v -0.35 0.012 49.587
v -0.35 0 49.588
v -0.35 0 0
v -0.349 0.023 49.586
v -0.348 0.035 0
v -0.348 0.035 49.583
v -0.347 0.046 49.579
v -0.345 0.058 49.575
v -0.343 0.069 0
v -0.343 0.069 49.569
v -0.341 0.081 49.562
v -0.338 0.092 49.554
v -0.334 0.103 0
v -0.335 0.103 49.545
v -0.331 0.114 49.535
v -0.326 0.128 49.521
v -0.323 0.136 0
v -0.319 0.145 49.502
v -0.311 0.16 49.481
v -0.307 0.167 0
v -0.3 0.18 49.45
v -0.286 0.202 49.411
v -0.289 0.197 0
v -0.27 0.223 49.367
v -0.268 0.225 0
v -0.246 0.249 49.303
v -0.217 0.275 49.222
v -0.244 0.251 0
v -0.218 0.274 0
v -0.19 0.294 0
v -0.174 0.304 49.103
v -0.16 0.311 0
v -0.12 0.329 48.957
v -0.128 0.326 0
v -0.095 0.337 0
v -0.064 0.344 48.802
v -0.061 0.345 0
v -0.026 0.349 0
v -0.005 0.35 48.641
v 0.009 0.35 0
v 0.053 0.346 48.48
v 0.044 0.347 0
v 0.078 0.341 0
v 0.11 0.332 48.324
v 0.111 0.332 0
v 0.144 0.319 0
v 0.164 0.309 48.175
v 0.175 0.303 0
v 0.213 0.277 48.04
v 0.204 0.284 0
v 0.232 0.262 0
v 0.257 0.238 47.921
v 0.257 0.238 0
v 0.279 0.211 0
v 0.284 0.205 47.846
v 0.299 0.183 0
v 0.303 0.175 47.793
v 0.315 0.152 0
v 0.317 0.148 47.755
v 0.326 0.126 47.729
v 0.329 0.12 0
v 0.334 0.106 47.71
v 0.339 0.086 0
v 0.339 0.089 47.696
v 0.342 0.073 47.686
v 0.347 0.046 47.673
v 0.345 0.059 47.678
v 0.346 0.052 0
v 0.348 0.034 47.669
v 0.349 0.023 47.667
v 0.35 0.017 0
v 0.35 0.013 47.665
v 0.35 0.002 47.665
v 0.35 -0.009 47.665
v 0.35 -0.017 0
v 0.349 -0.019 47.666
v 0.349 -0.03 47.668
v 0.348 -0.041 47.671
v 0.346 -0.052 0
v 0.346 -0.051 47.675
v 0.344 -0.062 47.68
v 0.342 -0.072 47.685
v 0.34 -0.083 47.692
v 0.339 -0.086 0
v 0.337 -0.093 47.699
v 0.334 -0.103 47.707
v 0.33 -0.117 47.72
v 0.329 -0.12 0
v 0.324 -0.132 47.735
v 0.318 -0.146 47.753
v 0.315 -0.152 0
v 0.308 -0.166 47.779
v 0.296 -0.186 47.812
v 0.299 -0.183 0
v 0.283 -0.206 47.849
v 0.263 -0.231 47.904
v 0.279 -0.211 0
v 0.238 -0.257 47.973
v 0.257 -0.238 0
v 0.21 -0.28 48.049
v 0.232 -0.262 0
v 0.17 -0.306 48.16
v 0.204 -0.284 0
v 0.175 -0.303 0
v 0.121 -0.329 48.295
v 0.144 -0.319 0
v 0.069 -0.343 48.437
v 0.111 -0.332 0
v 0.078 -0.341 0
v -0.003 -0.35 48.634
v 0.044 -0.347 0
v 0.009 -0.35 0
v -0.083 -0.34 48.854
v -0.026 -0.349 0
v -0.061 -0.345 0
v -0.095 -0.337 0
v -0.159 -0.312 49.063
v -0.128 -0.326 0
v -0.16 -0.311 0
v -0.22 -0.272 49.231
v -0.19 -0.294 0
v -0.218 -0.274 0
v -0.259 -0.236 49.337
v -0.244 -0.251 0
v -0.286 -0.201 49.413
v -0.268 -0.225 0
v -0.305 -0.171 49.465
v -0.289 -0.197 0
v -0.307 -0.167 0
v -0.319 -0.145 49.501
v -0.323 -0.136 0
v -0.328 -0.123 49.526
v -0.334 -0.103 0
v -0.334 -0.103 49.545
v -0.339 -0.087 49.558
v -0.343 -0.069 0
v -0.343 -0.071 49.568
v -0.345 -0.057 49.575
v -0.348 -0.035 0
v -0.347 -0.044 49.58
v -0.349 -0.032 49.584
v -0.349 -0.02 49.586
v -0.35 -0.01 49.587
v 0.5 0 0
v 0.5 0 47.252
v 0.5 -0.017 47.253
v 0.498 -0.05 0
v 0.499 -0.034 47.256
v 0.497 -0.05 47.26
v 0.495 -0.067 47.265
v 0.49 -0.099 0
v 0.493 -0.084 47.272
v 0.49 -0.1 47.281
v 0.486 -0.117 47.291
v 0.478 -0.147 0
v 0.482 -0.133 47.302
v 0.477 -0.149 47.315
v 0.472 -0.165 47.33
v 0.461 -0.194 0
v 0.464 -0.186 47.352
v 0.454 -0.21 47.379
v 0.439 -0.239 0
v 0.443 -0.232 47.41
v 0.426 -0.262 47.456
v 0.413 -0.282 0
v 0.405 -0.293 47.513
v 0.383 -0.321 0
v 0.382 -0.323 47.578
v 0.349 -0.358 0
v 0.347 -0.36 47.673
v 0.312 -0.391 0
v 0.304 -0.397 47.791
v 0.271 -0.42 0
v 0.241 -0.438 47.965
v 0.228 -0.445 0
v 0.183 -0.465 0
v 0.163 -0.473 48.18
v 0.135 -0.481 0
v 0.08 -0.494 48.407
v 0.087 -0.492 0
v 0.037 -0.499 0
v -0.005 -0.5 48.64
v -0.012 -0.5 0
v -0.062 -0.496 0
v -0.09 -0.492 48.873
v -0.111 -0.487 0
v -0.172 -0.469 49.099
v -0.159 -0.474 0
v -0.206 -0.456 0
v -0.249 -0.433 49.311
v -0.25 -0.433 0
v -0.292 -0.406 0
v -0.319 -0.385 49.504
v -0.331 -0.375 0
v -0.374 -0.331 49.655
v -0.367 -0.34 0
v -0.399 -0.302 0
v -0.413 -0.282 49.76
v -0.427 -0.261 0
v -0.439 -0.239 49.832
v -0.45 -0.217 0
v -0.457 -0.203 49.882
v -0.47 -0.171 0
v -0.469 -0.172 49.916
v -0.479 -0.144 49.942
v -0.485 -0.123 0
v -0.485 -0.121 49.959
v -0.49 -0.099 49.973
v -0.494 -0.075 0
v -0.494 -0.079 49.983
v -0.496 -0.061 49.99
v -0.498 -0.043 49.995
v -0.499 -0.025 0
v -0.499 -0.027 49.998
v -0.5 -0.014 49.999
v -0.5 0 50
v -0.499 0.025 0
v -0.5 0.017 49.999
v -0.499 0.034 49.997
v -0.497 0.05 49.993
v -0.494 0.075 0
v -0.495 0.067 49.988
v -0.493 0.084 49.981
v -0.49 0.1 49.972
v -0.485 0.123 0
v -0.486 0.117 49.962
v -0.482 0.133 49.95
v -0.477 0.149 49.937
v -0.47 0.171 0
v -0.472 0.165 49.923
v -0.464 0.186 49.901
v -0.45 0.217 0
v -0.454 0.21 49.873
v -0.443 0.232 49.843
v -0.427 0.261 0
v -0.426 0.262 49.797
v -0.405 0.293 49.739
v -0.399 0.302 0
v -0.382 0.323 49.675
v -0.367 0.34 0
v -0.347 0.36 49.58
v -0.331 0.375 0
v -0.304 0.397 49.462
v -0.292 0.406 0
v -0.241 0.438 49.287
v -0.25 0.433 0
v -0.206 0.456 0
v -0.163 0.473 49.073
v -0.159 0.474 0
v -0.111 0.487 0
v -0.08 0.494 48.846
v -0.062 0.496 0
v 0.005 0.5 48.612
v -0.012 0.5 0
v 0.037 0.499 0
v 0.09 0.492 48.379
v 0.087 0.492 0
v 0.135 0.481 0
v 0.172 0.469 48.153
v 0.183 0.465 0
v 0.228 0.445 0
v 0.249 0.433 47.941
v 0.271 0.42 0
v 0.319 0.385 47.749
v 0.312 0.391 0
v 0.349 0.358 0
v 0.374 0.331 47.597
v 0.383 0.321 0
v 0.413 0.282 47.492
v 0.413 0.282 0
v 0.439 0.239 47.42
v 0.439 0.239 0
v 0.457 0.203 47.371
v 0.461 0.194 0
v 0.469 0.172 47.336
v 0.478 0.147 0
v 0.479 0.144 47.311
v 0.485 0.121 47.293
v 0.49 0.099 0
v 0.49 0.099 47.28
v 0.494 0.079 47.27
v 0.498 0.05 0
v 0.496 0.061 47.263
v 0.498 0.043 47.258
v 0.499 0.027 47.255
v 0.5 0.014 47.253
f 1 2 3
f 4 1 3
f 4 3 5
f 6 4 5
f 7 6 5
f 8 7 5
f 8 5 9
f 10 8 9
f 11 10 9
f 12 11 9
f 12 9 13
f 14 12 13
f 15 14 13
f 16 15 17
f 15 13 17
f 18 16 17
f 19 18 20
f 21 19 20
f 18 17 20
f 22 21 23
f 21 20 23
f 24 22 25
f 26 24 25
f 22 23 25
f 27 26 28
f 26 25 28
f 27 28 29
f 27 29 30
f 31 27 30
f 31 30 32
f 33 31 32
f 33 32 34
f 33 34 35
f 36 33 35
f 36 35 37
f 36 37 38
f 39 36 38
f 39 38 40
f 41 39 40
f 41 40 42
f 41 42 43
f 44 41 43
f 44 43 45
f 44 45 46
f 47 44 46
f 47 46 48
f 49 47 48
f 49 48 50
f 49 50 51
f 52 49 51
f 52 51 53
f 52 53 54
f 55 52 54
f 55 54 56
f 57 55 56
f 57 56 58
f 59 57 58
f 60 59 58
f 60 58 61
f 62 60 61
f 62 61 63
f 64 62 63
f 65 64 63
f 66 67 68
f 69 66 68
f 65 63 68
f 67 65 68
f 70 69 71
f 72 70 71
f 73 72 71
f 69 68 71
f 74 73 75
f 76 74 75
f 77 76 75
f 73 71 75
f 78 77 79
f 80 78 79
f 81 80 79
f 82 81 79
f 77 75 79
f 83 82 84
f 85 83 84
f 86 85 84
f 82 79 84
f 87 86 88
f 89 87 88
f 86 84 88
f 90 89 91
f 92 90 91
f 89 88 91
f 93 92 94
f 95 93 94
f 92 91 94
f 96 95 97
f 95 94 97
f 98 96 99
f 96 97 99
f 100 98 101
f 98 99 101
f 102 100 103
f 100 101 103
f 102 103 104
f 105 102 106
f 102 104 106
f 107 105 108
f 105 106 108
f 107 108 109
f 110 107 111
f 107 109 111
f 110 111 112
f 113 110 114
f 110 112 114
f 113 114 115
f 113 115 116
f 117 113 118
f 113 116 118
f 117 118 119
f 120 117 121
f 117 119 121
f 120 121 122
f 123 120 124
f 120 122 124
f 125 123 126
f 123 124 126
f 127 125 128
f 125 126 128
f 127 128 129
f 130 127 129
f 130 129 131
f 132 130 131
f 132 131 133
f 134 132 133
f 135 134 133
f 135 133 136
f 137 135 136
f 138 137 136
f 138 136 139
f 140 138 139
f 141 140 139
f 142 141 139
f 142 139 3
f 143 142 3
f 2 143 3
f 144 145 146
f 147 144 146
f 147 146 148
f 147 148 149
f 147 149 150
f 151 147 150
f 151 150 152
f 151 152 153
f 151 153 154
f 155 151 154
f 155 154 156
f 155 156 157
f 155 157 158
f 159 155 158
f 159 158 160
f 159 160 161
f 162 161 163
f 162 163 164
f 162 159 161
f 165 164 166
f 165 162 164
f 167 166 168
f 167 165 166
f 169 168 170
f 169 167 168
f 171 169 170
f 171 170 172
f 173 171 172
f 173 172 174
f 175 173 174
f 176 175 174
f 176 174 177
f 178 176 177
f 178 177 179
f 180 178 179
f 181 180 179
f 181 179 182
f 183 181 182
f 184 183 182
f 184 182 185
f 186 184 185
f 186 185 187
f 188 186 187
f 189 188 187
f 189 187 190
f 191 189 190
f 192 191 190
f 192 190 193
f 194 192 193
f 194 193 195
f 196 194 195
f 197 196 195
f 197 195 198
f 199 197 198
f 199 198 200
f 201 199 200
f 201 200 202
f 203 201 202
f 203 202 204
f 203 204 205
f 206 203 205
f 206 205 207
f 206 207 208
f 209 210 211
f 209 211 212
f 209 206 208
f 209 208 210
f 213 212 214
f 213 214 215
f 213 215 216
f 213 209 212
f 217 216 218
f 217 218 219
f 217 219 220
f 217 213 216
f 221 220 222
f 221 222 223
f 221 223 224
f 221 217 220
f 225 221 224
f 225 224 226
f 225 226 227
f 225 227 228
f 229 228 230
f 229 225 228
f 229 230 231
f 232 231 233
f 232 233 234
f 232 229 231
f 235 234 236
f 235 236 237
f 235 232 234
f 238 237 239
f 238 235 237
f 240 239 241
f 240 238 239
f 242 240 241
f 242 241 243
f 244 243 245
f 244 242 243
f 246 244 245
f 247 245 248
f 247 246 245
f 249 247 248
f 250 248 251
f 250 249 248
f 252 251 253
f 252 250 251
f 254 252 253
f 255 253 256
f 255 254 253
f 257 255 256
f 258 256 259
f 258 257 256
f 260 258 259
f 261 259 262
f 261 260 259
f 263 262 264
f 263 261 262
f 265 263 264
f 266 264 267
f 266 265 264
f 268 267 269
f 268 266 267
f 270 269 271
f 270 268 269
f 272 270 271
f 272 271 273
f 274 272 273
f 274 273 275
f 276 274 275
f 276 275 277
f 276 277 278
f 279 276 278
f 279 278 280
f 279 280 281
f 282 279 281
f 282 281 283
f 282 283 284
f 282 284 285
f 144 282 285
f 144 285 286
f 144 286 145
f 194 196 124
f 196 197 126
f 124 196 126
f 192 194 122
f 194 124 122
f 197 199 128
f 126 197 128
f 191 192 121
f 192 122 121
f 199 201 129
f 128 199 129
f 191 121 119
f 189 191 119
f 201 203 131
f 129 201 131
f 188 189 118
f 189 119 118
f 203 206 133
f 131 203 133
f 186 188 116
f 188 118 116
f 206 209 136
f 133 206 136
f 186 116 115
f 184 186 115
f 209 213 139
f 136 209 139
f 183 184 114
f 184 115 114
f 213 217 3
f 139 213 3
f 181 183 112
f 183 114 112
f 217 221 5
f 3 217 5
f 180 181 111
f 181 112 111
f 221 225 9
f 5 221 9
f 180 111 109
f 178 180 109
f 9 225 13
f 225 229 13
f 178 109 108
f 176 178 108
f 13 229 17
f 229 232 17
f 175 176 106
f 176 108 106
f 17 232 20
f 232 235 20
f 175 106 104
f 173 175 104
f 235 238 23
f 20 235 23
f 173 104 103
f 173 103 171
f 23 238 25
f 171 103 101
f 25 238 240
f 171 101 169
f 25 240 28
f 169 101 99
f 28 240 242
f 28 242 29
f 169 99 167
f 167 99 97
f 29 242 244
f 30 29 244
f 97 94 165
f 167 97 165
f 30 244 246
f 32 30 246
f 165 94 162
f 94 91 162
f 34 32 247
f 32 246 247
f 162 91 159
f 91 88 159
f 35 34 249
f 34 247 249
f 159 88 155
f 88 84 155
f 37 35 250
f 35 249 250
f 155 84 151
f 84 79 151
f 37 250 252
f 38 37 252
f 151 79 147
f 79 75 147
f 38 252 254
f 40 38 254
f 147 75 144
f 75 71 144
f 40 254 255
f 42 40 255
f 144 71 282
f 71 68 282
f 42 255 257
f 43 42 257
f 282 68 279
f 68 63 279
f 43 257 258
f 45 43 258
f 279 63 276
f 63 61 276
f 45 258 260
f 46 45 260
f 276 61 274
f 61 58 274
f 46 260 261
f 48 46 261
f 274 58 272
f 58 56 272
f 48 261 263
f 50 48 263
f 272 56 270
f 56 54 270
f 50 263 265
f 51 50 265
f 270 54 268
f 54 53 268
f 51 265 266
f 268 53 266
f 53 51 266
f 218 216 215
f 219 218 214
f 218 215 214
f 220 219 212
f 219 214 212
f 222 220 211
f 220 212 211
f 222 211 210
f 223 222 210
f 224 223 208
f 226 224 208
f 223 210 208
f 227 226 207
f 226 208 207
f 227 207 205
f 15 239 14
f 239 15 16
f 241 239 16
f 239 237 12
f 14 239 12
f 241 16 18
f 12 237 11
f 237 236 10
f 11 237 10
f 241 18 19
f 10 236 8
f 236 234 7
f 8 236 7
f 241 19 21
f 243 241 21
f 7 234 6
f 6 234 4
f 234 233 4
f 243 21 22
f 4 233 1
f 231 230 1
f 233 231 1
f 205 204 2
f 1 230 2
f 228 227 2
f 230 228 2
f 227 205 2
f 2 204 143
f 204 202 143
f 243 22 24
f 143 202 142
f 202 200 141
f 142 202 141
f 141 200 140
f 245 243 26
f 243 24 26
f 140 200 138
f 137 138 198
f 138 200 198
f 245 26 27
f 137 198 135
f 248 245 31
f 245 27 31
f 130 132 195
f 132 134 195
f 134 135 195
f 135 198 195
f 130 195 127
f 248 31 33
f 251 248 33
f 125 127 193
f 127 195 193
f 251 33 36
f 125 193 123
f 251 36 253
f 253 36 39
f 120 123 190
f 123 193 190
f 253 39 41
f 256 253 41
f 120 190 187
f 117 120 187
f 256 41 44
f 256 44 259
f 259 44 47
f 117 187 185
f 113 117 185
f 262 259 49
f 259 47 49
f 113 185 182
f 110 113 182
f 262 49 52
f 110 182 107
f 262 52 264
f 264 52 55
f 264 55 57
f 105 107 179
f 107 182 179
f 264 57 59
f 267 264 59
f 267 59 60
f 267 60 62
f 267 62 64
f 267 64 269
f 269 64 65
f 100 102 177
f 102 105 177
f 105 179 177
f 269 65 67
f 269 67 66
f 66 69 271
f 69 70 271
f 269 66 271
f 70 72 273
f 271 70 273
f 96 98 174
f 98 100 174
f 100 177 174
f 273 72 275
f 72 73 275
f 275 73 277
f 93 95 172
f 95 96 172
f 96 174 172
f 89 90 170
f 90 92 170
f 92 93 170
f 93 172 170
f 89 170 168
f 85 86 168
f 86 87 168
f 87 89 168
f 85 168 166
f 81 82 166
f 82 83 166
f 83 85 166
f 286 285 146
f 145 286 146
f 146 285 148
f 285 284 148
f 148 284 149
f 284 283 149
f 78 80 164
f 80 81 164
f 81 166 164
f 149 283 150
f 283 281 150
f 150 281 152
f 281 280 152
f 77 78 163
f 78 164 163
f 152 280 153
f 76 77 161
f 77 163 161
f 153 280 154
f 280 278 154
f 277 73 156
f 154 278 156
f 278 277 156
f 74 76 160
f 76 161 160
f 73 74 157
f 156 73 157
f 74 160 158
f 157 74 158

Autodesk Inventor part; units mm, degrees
ref_plane "YZ Plane" through (0, 0, 0) normal (1, 0, 0) x (0, 1, 0)
ref_plane "XZ Plane" through (0, 0, 0) normal (0, 1, 0) x (-1, 0, 0)
ref_plane "UCS1: YZ Plane" through (-0.5, 0, 50) normal (0.9659, 0, 0.2588) x (0.2588, 0, -0.9659)
sketch "Sketch1" plane through (0, 0, 0) normal (0, 0, 1) x (1, 0, 0)
  circle A0 centre (0, 0) radius 0.5
  dimension "d0" = 1
extrude "Extrusion1" add sketch "Sketch1" along normal blind 50
sketch "Sketch2" plane through (0, 0, 50) normal (0, 0, 1) x (1, 0, 0)
  circle A0 centre (0, 0) radius 0.5 projected
  line L0 (-0.7, 0) -> (0.7, 0) projected
  line L1 (0, -0.7) -> (0, 0.7) projected
  point P0 (0, 0.5)
  point P1 (0.5, 0)
  point P2 (-0.5, 0)
sketch "Sketch3" plane through (-0.5, 0, 50) normal (0, 1, 0) x (0.9659, 0, 0.2588)
  point P0 (0, 0)
sketch "Sketch4" plane through (0, 0, 0) normal (0, 1, 0) x (-1, 0, 0)
  line L0 (-0.5, 0) -> (-0.5, 50) projected
  line L1 (0.5, 0) -> (0.5, 50) projected
  line L2 (0.5, 50) -> (-0.5, 47.2525)
  line L3 (-0.5, 50) -> (0.5, 50) projected
  point P0 (0, 0)
  dimension "d9" = 70
extrude "Extrusion2" cut sketch "Sketch4" along normal through all both and the other way through all
sketch "Sketch5" plane through (0, 0, 0) normal (0, 0, -1) x (-1, 0, 0)
  circle A0 centre (0, 0) radius 0.5 projected
  circle A1 centre (0, 0) radius 0.35
  dimension "d12" = 0.7
extrude "Hole" cut sketch "Sketch5" against normal through all contours A1
ref_plane "Work Plane1" through (0, 0, 30) normal (0, 0, 1) x (1, 0, 0)
sketch "Sketch6" plane through (0, 0, 30) normal (0, 0, 1) x (1, 0, 0)
  circle A0 centre (0, 0) radius 0.6
  dimension "d16" = 1.2
extrude "Extrusion4" [suppressed]
properties part number "Needle3" material "Stainless Steel, 440C"
